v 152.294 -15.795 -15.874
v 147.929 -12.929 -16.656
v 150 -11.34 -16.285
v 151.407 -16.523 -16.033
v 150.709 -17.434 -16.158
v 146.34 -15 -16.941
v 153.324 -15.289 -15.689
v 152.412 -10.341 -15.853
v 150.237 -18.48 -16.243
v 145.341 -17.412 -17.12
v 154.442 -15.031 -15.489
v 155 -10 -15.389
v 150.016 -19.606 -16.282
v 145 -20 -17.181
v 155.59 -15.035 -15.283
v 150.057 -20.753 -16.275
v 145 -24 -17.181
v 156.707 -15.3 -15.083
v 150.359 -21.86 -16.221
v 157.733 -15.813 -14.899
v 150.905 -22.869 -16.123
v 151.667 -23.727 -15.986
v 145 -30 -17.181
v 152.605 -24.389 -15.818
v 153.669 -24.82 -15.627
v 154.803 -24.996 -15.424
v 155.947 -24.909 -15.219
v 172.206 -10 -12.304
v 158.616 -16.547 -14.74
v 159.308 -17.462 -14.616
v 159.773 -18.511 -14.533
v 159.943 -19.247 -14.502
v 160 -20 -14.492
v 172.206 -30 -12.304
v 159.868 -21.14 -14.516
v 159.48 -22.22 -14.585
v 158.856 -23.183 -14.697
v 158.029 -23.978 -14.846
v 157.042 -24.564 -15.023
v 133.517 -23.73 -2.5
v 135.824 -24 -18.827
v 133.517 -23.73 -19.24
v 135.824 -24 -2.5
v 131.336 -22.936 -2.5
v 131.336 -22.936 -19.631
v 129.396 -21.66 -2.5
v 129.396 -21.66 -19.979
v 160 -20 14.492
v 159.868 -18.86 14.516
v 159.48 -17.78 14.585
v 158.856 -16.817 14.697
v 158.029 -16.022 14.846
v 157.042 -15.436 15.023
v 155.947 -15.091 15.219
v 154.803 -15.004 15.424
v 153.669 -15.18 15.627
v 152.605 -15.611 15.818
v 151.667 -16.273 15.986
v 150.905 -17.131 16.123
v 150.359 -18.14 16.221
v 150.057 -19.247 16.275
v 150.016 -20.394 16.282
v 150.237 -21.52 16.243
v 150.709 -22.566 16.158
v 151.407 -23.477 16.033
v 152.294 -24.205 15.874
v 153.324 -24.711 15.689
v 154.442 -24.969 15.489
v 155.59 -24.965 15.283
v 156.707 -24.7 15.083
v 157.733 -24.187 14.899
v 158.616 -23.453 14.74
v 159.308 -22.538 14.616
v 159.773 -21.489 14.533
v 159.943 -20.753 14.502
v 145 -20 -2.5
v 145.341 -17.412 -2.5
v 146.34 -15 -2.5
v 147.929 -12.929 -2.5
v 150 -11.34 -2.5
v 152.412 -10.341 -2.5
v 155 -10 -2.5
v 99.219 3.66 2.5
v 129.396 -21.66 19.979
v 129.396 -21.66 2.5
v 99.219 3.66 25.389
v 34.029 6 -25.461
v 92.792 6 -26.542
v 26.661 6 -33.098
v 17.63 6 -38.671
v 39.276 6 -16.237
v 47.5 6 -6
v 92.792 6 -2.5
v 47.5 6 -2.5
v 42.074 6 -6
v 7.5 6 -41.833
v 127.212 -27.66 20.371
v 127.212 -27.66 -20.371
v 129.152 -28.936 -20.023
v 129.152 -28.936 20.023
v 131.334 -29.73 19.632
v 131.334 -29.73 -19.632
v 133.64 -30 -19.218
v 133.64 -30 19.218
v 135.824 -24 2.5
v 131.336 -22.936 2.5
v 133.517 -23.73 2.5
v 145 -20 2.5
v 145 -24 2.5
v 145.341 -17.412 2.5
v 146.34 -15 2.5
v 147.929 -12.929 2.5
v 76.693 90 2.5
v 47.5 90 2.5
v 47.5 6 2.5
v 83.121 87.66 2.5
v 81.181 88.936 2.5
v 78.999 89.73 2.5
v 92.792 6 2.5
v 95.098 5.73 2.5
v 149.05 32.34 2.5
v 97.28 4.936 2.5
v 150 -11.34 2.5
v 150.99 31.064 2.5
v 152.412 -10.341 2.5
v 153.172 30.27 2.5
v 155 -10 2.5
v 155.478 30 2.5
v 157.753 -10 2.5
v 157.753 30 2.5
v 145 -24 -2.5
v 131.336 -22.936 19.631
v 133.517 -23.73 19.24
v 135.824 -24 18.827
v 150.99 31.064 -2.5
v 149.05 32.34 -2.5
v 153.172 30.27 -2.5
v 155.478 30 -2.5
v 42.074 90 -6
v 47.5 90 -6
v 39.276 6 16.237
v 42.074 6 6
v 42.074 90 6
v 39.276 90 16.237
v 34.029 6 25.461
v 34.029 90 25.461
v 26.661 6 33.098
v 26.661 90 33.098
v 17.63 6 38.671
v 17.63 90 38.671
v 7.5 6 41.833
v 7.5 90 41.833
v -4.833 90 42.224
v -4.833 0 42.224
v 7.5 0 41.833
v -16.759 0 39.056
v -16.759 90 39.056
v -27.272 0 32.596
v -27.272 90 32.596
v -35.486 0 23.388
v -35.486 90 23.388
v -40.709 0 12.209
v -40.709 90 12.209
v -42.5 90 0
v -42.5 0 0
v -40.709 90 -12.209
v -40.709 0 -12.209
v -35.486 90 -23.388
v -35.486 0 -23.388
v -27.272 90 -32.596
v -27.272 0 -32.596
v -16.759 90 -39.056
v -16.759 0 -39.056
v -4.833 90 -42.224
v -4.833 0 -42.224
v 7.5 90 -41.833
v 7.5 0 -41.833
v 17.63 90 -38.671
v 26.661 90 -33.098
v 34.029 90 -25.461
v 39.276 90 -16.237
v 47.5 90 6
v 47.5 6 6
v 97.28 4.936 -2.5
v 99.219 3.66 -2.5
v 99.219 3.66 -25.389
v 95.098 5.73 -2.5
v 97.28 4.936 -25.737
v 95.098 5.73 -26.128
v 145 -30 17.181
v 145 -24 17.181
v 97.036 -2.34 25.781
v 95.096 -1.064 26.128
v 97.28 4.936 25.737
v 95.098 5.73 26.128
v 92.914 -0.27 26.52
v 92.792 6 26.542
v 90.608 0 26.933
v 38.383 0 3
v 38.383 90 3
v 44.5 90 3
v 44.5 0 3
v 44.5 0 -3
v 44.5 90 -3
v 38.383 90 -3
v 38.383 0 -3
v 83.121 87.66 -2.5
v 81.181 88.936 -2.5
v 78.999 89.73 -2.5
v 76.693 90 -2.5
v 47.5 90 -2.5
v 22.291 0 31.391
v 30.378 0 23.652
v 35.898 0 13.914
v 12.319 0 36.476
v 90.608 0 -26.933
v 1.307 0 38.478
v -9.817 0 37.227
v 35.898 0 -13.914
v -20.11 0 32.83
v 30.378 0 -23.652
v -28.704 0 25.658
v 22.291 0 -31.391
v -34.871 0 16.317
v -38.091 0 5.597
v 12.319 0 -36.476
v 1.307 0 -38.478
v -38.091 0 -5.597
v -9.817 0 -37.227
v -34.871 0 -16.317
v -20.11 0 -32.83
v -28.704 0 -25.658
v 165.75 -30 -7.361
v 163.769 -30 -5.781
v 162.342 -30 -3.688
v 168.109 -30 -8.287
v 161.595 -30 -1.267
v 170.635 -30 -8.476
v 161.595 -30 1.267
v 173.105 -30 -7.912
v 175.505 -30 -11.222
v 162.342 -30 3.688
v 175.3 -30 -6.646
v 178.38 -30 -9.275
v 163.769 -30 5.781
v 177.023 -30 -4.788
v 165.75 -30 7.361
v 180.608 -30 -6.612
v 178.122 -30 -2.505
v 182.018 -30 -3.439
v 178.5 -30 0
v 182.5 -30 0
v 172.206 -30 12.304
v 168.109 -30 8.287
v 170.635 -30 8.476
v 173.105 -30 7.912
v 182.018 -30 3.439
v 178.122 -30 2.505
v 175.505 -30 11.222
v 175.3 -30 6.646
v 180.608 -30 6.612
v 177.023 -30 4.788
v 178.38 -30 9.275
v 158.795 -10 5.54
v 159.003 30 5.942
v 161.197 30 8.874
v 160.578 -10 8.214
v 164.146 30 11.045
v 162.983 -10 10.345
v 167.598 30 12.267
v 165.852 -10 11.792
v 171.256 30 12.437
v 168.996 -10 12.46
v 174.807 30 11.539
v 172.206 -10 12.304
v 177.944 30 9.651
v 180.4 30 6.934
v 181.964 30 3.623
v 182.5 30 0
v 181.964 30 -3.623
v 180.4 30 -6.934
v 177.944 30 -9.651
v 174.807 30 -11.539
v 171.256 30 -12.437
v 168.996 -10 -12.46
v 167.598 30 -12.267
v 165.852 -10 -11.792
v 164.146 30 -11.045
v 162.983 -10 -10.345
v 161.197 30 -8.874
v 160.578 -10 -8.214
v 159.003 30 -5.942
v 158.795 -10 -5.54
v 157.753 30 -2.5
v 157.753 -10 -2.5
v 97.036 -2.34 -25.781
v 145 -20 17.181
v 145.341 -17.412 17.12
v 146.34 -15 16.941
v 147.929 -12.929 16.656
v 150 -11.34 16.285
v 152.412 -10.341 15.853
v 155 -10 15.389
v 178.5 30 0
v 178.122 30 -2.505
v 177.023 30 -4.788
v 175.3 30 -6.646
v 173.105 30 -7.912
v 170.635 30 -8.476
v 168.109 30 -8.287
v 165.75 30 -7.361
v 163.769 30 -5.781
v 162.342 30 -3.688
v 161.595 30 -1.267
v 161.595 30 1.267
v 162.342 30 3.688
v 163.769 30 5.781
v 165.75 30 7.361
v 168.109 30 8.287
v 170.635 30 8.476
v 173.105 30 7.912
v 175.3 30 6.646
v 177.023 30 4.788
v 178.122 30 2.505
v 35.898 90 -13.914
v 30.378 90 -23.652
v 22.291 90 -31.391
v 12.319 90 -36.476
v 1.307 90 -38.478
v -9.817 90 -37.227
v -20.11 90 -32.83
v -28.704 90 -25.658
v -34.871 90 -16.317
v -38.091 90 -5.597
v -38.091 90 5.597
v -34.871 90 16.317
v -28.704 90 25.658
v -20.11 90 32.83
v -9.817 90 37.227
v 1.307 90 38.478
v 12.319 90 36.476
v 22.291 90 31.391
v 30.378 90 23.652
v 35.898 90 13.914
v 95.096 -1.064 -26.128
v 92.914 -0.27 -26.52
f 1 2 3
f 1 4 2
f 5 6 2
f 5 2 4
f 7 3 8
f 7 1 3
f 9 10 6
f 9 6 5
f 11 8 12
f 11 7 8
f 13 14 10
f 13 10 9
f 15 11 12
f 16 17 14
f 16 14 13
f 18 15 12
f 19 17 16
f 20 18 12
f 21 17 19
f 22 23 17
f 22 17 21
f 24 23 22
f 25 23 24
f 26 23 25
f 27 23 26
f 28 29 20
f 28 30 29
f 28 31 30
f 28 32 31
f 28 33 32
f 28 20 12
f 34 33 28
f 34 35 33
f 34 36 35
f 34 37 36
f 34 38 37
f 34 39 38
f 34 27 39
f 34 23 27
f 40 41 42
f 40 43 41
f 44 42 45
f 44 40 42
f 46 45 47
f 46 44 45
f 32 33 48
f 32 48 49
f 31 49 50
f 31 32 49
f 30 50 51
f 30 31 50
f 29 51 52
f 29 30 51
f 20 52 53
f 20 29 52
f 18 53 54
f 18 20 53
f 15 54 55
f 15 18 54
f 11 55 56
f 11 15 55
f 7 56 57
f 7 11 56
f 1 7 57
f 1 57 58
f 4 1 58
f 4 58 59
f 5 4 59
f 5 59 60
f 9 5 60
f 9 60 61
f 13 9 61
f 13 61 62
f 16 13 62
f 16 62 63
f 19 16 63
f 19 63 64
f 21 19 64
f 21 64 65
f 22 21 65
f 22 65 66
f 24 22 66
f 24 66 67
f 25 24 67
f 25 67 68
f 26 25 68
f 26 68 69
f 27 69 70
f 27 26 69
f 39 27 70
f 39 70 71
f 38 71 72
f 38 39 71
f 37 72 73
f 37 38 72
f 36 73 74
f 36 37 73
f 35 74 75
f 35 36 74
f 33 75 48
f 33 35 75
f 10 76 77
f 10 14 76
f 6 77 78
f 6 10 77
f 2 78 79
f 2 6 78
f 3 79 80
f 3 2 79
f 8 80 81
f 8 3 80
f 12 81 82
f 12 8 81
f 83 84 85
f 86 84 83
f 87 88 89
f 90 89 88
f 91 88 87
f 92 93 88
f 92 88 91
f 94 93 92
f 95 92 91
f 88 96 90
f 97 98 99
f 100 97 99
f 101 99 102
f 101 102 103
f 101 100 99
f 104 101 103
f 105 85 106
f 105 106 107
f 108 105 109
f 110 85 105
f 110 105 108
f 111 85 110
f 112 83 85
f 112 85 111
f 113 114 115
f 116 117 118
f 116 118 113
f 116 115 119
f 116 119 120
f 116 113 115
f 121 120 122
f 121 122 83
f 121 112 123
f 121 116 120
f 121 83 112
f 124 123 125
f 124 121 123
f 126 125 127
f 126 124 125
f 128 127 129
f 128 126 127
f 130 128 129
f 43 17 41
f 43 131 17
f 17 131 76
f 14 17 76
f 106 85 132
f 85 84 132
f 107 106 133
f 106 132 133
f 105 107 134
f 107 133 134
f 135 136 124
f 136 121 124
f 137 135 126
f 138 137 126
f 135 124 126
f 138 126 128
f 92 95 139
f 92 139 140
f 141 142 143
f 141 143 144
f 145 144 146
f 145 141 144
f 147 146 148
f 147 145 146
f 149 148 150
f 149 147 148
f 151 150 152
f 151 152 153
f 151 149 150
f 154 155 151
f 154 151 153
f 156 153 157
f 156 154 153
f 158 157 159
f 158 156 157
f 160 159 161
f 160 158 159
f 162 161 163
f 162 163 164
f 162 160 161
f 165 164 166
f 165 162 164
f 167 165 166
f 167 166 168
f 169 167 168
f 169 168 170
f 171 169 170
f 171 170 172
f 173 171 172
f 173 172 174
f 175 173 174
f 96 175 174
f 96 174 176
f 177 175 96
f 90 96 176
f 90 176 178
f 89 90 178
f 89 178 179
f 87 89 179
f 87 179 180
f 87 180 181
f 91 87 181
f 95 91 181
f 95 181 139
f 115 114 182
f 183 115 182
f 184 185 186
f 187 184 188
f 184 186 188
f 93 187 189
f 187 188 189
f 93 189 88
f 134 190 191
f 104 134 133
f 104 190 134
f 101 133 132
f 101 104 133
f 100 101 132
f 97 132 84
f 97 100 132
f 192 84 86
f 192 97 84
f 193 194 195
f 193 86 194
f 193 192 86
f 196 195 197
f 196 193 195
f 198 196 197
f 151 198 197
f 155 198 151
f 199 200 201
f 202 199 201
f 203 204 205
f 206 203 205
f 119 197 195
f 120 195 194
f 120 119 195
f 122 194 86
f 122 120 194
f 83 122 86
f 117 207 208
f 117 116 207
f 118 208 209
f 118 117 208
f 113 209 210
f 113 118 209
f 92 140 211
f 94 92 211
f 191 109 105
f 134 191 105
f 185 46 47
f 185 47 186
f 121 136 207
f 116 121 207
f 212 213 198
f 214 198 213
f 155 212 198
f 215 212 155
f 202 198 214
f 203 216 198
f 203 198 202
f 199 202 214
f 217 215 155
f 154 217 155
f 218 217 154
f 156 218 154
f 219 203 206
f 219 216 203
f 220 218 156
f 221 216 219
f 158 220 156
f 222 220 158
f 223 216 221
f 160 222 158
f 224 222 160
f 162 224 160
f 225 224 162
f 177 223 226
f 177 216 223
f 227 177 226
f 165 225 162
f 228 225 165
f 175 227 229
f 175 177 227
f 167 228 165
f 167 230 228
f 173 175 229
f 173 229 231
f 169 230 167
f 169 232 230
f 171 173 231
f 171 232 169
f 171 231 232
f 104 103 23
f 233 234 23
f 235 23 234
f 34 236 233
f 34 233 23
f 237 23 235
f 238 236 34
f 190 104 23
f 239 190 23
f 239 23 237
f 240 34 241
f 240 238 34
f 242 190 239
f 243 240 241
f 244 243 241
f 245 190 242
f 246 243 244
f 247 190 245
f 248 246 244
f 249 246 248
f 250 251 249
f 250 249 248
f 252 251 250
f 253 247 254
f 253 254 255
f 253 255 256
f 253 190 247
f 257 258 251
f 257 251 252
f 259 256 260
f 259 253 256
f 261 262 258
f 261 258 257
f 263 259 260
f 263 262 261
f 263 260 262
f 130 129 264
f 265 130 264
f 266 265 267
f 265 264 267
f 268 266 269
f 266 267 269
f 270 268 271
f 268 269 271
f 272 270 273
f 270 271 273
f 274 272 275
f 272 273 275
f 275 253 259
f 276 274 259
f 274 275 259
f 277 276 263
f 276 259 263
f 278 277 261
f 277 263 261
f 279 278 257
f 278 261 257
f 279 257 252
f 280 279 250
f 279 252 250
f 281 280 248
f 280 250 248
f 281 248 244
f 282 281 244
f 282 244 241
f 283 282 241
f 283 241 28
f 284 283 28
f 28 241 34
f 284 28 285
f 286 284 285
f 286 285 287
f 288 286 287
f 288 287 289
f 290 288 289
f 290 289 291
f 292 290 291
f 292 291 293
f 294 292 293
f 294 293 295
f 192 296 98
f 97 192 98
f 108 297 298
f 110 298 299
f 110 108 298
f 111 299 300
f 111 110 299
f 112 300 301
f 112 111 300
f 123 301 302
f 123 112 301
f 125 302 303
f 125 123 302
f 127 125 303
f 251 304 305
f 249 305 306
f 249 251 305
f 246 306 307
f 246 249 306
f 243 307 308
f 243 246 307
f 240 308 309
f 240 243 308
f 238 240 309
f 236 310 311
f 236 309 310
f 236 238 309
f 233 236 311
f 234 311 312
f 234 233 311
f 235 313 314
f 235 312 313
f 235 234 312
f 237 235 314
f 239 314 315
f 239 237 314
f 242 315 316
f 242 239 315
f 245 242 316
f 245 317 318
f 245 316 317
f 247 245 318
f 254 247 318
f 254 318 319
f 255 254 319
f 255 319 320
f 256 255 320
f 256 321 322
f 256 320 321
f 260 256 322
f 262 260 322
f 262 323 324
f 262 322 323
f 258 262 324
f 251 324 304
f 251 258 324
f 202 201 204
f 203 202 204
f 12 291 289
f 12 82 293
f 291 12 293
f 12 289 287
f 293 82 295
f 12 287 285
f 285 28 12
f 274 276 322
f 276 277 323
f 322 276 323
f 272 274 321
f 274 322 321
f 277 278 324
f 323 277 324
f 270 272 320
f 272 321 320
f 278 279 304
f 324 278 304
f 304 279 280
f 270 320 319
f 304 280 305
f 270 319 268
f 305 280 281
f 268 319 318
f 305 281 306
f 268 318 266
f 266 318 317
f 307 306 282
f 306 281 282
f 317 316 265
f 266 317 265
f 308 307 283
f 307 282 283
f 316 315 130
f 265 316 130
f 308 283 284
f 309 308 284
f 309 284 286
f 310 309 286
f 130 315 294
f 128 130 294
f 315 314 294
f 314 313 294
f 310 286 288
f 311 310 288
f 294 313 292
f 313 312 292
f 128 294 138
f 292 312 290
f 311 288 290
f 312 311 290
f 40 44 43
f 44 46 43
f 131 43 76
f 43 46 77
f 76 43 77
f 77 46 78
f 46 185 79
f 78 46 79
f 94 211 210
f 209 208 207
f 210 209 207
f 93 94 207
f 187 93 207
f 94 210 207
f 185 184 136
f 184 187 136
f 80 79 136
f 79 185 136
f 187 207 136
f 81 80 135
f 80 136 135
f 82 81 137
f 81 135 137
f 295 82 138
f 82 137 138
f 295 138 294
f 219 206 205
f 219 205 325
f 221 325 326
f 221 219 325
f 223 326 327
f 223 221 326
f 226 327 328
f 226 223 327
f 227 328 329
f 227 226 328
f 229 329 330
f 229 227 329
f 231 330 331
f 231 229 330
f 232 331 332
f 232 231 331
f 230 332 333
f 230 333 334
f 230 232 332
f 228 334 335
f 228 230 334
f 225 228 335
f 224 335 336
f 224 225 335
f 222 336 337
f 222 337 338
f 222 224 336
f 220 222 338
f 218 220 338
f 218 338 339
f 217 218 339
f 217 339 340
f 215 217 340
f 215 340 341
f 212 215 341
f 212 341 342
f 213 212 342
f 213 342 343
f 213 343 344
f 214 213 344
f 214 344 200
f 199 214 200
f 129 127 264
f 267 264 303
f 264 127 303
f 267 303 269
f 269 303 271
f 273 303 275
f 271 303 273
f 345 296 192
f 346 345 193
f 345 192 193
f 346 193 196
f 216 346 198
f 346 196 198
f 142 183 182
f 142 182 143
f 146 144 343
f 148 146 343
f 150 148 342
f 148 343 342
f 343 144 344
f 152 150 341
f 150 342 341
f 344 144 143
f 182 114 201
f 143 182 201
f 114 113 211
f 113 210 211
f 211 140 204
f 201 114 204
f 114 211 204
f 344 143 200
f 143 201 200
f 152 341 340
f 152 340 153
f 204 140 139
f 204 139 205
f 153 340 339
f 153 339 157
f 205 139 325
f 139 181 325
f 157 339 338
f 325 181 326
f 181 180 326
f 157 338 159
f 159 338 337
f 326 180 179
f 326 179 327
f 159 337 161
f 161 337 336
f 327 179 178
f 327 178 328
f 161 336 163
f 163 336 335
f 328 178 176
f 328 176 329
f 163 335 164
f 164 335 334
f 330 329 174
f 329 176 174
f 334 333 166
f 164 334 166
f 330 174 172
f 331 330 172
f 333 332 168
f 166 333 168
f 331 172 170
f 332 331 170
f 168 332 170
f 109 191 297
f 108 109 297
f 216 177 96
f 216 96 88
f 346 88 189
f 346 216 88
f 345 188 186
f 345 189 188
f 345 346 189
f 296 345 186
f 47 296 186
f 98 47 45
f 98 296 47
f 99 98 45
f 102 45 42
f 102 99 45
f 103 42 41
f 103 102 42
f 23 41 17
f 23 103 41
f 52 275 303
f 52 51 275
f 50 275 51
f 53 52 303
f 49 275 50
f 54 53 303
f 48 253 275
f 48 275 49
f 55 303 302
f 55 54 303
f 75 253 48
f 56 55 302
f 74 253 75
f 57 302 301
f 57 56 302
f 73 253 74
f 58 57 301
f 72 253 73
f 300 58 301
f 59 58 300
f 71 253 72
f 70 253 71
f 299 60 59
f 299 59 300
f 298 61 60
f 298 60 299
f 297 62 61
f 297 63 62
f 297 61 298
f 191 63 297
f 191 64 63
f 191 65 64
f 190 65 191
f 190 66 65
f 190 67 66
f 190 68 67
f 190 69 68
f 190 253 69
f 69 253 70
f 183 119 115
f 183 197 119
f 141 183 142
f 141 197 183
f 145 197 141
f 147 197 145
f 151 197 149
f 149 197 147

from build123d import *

# Parameters (mm, degrees)
BOSS_EXTRUDE1_DEPTH     = 90
BOSS_EXTRUDE2_START     = -30
SKETCH2_3_R             = 12.5
BOSS_EXTRUDE2_DEPTH     = 60
EXTRUDE_THIN1_DEPTH     = 115
SKETCH5_W               = 50
SKETCH5_H               = 20
BOSS_EXTRUDE3_DEPTH     = 230
CUT_EXTRUDE2_DEPTH      = 315.682379551
CUT_EXTRUDE2_DEPTH_BACK = 315.682379551
SKETCH5_3_R             = 5
CUT_EXTRUDE1_START      = -30
CUT_EXTRUDE1_OUTLINE_R  = 8.5
CUT_EXTRUDE1_DEPTH      = 120
RIB1_START              = -2.5
RIB1_DEPTH              = 5
FILLET1_R               = 10


# Read off the part's stored shape, not the designer's step: Cut-Extrude1, Rib1
with BuildPart() as part:
    # Sketch2 → Boss-Extrude1 (new body)
    with BuildSketch(Plane(origin=(0, 0, 0), x_dir=(1, 0, 0), z_dir=(0, 1, 0))):
        with BuildLine():
            Line((42.074338973, 6), (47.5, 6))
            Line((47.5, 6), (47.5, -6))
            Line((47.5, -6), (42.074338973, -6))
            ThreePointArc((42.074338973, -6), (-42.5, 0), (42.074338973, 6))
        make_face()
    extrude(amount=BOSS_EXTRUDE1_DEPTH)



with BuildPart() as body_2:
    # Sketch2<3> → Boss-Extrude2 (new body)
    with BuildSketch(Plane(origin=(0, 0, 0), x_dir=(1, 0, 0), z_dir=(0, 1, 0)).offset(BOSS_EXTRUDE2_START)):
        with Locations(Location((170, 0, 0), (0, 0, 270))):
            Circle(SKETCH2_3_R)
    extrude(amount=BOSS_EXTRUDE2_DEPTH)


with BuildPart() as part_1:
    add(part.part)

    add(body_2.part)  # Extrude-Thin1 merges body 2
    # Sketch3 → Extrude-Thin1 (add, symmetric)
    with BuildSketch(Plane.XY):
        Polygon((-42.5, 0), (94.247392222, 0), (130, -30), (182.5, -30), (182.5, -24), (132.183821406, -24), (96.431213628, 6), (-42.5, 6), align=None)
    extrude(amount=EXTRUDE_THIN1_DEPTH, both=True)

    # Sketch5 → Boss-Extrude3 (add)
    with BuildSketch(Plane.XY.offset(115)):
        with Locations((170, -20)):
            Rectangle(SKETCH5_W, SKETCH5_H)
    extrude(amount=-BOSS_EXTRUDE3_DEPTH)

    # Sketch5<3> → Cut-Extrude2 (cut, two sides: drawn at the far end of the back side and taken through both)
    with BuildSketch(Plane.XY.offset(115).offset(-CUT_EXTRUDE2_DEPTH_BACK)):
        with Locations((155, -20)):
            Circle(SKETCH5_3_R)
    extrude(amount=CUT_EXTRUDE2_DEPTH + CUT_EXTRUDE2_DEPTH_BACK, mode=Mode.SUBTRACT)

    # Cut-Extrude1 outline → Cut-Extrude1 (cut)
    with BuildSketch(Plane(origin=(0, 0, 0), x_dir=(1, 0, 0), z_dir=(0, 1, 0)).offset(CUT_EXTRUDE1_START)):
        with BuildLine():
            ThreePointArc((-42.5, 2.03e-07), (-27.271780209, 32.596012091), (7.5, 41.833001327))
            Line((7.5, 41.833001327), (145, 17.181411259))
            Line((145, 17.181411259), (145, 115))
            Line((145, 115), (-42.5, 115))
            Line((-42.5, 115), (-42.5, 2.03e-07))
        make_face()
        with BuildLine():
            Line((145, 115), (145, 17.181411259))
            Line((145, 17.181411259), (172.205882353, 12.30382392))
            ThreePointArc((172.205882353, 12.30382392), (179.587062361, 8.021111849), (182.5, 0))
            ThreePointArc((182.5, 0), (179.587062361, -8.021111849), (172.205882353, -12.30382392))
            Line((172.205882353, -12.30382392), (145, -17.181411259))
            Line((145, -17.181411259), (145, -115))
            Line((145, -115), (195, -115))
            Line((195, -115), (195, 115))
            Line((195, 115), (145, 115))
        make_face()
        with BuildLine():
            ThreePointArc((7.5, -41.833001327), (-27.271780365, -32.596011961), (-42.5, 2.03e-07))
            Line((-42.5, 2.03e-07), (-42.5, -115))
            Line((-42.5, -115), (145, -115))
            Line((145, -115), (145, -17.181411259))
            Line((145, -17.181411259), (7.5, -41.833001327))
        make_face()
        with BuildLine():
            Line((44.5, 3), (38.382938918, 3))
            ThreePointArc((38.382938918, 3), (-38.5, 0), (38.382938918, -3))
            Line((38.382938918, -3), (44.5, -3))
            Line((44.5, -3), (44.5, 3))
        make_face()
        with Locations((170, 0)):
            Circle(CUT_EXTRUDE1_OUTLINE_R)
    extrude(amount=CUT_EXTRUDE1_DEPTH, mode=Mode.SUBTRACT)

    # Rib1 outline → Rib1 (add)
    with BuildSketch(Plane.XY.offset(RIB1_START)):
        Polygon((151.838214056, 30), (80.3329985, 90), (47.5, 90), (47.5, 6), (96.431213628, 6), (132.183821406, -24), (145, -24), (145, -10), (159, -10), (159, 30), align=None)
    extrude(amount=RIB1_DEPTH)

    # Fillet1
    fillet1_edges = [part_1.edges().sort_by_distance(p)[0] for p in [
        (145, -10, 9.84070563),
        (132.183821406, -24, -10.989575378),
        (96.431213628, 6, -14.194515854),
        (151.838214056, 30, 0),
        (80.3329985, 90, 0),
        (145, -10, -9.84070563),
        (94.247392222, 0, 0),
        (96.431213628, 6, 14.194515854),
        (132.183821406, -24, 10.989575378),
        (130, -30, 0),
    ]]
    fillet(fillet1_edges, radius=FILLET1_R)


solid = part_1.part
